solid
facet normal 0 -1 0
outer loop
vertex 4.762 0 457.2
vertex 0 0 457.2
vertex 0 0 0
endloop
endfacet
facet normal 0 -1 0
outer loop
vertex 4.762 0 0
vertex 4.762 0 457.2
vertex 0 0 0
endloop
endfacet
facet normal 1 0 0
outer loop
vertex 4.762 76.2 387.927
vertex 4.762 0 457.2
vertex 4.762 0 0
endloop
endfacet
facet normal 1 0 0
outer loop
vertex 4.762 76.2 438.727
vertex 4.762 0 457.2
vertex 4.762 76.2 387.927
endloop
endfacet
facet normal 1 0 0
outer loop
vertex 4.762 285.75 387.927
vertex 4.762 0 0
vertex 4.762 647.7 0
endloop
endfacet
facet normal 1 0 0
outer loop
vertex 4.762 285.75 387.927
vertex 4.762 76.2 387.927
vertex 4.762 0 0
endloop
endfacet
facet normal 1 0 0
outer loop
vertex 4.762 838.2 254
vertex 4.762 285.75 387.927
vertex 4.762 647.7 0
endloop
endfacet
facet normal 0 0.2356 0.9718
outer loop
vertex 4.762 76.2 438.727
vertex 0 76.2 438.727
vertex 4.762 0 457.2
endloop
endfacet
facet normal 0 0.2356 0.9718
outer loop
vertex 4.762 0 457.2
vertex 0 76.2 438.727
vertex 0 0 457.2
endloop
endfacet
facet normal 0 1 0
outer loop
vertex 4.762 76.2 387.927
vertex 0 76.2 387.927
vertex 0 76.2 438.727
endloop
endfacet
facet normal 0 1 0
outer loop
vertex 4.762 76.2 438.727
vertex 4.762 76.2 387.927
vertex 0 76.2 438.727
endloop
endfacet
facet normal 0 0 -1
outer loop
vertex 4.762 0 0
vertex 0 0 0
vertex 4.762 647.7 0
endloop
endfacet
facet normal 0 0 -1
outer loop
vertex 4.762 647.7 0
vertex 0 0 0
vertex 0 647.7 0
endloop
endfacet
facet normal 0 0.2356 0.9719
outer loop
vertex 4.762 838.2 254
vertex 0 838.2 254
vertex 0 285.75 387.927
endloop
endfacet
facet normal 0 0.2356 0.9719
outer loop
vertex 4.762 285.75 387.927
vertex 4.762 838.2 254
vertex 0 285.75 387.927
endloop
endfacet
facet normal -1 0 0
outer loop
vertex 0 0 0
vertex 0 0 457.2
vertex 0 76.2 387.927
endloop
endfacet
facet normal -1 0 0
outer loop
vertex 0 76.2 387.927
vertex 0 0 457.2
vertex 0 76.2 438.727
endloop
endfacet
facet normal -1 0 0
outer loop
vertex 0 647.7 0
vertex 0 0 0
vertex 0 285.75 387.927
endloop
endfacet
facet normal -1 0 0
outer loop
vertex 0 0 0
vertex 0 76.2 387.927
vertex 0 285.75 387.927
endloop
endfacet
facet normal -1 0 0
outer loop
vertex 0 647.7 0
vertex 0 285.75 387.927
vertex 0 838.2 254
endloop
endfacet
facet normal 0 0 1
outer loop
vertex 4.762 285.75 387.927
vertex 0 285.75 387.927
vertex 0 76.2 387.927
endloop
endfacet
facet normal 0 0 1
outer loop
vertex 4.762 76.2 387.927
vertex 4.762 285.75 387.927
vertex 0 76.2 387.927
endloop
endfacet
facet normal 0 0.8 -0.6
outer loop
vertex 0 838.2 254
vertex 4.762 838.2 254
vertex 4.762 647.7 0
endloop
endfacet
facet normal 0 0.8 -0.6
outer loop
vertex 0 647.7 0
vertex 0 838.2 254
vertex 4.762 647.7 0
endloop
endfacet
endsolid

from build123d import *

# Parameters (mm, degrees)
F1_DEPTH = 4.7625
F3_DEPTH = 4.7635
F5_DEPTH = 4.7635


with BuildPart() as f1:
    # F0 (on Right) → F1 (new body)
    with BuildSketch(Plane.YZ):
        Polygon((0, 457.2), (0, 0), (838.2, 0), (838.2, 254), align=None)
    extrude(amount=F1_DEPTH)

    # F2 (on face) → F3 (cut, through all)
    with BuildSketch(Plane(origin=(0, 0, 0), x_dir=(0, -1, 0), z_dir=(-1, 0, 0))):
        Polygon((-76.2, 387.927273), (-76.2, 438.727273), (-285.75, 387.927273), align=None)
    extrude(amount=-F3_DEPTH, mode=Mode.SUBTRACT)

    # F4 (on face) → F5 (cut, through all)
    with BuildSketch(Plane.YZ.offset(4.7625)):
        Polygon((838.2, 0), (838.2, 254), (647.7, 0), align=None)
    extrude(amount=-F5_DEPTH, mode=Mode.SUBTRACT)


solid = f1.part
